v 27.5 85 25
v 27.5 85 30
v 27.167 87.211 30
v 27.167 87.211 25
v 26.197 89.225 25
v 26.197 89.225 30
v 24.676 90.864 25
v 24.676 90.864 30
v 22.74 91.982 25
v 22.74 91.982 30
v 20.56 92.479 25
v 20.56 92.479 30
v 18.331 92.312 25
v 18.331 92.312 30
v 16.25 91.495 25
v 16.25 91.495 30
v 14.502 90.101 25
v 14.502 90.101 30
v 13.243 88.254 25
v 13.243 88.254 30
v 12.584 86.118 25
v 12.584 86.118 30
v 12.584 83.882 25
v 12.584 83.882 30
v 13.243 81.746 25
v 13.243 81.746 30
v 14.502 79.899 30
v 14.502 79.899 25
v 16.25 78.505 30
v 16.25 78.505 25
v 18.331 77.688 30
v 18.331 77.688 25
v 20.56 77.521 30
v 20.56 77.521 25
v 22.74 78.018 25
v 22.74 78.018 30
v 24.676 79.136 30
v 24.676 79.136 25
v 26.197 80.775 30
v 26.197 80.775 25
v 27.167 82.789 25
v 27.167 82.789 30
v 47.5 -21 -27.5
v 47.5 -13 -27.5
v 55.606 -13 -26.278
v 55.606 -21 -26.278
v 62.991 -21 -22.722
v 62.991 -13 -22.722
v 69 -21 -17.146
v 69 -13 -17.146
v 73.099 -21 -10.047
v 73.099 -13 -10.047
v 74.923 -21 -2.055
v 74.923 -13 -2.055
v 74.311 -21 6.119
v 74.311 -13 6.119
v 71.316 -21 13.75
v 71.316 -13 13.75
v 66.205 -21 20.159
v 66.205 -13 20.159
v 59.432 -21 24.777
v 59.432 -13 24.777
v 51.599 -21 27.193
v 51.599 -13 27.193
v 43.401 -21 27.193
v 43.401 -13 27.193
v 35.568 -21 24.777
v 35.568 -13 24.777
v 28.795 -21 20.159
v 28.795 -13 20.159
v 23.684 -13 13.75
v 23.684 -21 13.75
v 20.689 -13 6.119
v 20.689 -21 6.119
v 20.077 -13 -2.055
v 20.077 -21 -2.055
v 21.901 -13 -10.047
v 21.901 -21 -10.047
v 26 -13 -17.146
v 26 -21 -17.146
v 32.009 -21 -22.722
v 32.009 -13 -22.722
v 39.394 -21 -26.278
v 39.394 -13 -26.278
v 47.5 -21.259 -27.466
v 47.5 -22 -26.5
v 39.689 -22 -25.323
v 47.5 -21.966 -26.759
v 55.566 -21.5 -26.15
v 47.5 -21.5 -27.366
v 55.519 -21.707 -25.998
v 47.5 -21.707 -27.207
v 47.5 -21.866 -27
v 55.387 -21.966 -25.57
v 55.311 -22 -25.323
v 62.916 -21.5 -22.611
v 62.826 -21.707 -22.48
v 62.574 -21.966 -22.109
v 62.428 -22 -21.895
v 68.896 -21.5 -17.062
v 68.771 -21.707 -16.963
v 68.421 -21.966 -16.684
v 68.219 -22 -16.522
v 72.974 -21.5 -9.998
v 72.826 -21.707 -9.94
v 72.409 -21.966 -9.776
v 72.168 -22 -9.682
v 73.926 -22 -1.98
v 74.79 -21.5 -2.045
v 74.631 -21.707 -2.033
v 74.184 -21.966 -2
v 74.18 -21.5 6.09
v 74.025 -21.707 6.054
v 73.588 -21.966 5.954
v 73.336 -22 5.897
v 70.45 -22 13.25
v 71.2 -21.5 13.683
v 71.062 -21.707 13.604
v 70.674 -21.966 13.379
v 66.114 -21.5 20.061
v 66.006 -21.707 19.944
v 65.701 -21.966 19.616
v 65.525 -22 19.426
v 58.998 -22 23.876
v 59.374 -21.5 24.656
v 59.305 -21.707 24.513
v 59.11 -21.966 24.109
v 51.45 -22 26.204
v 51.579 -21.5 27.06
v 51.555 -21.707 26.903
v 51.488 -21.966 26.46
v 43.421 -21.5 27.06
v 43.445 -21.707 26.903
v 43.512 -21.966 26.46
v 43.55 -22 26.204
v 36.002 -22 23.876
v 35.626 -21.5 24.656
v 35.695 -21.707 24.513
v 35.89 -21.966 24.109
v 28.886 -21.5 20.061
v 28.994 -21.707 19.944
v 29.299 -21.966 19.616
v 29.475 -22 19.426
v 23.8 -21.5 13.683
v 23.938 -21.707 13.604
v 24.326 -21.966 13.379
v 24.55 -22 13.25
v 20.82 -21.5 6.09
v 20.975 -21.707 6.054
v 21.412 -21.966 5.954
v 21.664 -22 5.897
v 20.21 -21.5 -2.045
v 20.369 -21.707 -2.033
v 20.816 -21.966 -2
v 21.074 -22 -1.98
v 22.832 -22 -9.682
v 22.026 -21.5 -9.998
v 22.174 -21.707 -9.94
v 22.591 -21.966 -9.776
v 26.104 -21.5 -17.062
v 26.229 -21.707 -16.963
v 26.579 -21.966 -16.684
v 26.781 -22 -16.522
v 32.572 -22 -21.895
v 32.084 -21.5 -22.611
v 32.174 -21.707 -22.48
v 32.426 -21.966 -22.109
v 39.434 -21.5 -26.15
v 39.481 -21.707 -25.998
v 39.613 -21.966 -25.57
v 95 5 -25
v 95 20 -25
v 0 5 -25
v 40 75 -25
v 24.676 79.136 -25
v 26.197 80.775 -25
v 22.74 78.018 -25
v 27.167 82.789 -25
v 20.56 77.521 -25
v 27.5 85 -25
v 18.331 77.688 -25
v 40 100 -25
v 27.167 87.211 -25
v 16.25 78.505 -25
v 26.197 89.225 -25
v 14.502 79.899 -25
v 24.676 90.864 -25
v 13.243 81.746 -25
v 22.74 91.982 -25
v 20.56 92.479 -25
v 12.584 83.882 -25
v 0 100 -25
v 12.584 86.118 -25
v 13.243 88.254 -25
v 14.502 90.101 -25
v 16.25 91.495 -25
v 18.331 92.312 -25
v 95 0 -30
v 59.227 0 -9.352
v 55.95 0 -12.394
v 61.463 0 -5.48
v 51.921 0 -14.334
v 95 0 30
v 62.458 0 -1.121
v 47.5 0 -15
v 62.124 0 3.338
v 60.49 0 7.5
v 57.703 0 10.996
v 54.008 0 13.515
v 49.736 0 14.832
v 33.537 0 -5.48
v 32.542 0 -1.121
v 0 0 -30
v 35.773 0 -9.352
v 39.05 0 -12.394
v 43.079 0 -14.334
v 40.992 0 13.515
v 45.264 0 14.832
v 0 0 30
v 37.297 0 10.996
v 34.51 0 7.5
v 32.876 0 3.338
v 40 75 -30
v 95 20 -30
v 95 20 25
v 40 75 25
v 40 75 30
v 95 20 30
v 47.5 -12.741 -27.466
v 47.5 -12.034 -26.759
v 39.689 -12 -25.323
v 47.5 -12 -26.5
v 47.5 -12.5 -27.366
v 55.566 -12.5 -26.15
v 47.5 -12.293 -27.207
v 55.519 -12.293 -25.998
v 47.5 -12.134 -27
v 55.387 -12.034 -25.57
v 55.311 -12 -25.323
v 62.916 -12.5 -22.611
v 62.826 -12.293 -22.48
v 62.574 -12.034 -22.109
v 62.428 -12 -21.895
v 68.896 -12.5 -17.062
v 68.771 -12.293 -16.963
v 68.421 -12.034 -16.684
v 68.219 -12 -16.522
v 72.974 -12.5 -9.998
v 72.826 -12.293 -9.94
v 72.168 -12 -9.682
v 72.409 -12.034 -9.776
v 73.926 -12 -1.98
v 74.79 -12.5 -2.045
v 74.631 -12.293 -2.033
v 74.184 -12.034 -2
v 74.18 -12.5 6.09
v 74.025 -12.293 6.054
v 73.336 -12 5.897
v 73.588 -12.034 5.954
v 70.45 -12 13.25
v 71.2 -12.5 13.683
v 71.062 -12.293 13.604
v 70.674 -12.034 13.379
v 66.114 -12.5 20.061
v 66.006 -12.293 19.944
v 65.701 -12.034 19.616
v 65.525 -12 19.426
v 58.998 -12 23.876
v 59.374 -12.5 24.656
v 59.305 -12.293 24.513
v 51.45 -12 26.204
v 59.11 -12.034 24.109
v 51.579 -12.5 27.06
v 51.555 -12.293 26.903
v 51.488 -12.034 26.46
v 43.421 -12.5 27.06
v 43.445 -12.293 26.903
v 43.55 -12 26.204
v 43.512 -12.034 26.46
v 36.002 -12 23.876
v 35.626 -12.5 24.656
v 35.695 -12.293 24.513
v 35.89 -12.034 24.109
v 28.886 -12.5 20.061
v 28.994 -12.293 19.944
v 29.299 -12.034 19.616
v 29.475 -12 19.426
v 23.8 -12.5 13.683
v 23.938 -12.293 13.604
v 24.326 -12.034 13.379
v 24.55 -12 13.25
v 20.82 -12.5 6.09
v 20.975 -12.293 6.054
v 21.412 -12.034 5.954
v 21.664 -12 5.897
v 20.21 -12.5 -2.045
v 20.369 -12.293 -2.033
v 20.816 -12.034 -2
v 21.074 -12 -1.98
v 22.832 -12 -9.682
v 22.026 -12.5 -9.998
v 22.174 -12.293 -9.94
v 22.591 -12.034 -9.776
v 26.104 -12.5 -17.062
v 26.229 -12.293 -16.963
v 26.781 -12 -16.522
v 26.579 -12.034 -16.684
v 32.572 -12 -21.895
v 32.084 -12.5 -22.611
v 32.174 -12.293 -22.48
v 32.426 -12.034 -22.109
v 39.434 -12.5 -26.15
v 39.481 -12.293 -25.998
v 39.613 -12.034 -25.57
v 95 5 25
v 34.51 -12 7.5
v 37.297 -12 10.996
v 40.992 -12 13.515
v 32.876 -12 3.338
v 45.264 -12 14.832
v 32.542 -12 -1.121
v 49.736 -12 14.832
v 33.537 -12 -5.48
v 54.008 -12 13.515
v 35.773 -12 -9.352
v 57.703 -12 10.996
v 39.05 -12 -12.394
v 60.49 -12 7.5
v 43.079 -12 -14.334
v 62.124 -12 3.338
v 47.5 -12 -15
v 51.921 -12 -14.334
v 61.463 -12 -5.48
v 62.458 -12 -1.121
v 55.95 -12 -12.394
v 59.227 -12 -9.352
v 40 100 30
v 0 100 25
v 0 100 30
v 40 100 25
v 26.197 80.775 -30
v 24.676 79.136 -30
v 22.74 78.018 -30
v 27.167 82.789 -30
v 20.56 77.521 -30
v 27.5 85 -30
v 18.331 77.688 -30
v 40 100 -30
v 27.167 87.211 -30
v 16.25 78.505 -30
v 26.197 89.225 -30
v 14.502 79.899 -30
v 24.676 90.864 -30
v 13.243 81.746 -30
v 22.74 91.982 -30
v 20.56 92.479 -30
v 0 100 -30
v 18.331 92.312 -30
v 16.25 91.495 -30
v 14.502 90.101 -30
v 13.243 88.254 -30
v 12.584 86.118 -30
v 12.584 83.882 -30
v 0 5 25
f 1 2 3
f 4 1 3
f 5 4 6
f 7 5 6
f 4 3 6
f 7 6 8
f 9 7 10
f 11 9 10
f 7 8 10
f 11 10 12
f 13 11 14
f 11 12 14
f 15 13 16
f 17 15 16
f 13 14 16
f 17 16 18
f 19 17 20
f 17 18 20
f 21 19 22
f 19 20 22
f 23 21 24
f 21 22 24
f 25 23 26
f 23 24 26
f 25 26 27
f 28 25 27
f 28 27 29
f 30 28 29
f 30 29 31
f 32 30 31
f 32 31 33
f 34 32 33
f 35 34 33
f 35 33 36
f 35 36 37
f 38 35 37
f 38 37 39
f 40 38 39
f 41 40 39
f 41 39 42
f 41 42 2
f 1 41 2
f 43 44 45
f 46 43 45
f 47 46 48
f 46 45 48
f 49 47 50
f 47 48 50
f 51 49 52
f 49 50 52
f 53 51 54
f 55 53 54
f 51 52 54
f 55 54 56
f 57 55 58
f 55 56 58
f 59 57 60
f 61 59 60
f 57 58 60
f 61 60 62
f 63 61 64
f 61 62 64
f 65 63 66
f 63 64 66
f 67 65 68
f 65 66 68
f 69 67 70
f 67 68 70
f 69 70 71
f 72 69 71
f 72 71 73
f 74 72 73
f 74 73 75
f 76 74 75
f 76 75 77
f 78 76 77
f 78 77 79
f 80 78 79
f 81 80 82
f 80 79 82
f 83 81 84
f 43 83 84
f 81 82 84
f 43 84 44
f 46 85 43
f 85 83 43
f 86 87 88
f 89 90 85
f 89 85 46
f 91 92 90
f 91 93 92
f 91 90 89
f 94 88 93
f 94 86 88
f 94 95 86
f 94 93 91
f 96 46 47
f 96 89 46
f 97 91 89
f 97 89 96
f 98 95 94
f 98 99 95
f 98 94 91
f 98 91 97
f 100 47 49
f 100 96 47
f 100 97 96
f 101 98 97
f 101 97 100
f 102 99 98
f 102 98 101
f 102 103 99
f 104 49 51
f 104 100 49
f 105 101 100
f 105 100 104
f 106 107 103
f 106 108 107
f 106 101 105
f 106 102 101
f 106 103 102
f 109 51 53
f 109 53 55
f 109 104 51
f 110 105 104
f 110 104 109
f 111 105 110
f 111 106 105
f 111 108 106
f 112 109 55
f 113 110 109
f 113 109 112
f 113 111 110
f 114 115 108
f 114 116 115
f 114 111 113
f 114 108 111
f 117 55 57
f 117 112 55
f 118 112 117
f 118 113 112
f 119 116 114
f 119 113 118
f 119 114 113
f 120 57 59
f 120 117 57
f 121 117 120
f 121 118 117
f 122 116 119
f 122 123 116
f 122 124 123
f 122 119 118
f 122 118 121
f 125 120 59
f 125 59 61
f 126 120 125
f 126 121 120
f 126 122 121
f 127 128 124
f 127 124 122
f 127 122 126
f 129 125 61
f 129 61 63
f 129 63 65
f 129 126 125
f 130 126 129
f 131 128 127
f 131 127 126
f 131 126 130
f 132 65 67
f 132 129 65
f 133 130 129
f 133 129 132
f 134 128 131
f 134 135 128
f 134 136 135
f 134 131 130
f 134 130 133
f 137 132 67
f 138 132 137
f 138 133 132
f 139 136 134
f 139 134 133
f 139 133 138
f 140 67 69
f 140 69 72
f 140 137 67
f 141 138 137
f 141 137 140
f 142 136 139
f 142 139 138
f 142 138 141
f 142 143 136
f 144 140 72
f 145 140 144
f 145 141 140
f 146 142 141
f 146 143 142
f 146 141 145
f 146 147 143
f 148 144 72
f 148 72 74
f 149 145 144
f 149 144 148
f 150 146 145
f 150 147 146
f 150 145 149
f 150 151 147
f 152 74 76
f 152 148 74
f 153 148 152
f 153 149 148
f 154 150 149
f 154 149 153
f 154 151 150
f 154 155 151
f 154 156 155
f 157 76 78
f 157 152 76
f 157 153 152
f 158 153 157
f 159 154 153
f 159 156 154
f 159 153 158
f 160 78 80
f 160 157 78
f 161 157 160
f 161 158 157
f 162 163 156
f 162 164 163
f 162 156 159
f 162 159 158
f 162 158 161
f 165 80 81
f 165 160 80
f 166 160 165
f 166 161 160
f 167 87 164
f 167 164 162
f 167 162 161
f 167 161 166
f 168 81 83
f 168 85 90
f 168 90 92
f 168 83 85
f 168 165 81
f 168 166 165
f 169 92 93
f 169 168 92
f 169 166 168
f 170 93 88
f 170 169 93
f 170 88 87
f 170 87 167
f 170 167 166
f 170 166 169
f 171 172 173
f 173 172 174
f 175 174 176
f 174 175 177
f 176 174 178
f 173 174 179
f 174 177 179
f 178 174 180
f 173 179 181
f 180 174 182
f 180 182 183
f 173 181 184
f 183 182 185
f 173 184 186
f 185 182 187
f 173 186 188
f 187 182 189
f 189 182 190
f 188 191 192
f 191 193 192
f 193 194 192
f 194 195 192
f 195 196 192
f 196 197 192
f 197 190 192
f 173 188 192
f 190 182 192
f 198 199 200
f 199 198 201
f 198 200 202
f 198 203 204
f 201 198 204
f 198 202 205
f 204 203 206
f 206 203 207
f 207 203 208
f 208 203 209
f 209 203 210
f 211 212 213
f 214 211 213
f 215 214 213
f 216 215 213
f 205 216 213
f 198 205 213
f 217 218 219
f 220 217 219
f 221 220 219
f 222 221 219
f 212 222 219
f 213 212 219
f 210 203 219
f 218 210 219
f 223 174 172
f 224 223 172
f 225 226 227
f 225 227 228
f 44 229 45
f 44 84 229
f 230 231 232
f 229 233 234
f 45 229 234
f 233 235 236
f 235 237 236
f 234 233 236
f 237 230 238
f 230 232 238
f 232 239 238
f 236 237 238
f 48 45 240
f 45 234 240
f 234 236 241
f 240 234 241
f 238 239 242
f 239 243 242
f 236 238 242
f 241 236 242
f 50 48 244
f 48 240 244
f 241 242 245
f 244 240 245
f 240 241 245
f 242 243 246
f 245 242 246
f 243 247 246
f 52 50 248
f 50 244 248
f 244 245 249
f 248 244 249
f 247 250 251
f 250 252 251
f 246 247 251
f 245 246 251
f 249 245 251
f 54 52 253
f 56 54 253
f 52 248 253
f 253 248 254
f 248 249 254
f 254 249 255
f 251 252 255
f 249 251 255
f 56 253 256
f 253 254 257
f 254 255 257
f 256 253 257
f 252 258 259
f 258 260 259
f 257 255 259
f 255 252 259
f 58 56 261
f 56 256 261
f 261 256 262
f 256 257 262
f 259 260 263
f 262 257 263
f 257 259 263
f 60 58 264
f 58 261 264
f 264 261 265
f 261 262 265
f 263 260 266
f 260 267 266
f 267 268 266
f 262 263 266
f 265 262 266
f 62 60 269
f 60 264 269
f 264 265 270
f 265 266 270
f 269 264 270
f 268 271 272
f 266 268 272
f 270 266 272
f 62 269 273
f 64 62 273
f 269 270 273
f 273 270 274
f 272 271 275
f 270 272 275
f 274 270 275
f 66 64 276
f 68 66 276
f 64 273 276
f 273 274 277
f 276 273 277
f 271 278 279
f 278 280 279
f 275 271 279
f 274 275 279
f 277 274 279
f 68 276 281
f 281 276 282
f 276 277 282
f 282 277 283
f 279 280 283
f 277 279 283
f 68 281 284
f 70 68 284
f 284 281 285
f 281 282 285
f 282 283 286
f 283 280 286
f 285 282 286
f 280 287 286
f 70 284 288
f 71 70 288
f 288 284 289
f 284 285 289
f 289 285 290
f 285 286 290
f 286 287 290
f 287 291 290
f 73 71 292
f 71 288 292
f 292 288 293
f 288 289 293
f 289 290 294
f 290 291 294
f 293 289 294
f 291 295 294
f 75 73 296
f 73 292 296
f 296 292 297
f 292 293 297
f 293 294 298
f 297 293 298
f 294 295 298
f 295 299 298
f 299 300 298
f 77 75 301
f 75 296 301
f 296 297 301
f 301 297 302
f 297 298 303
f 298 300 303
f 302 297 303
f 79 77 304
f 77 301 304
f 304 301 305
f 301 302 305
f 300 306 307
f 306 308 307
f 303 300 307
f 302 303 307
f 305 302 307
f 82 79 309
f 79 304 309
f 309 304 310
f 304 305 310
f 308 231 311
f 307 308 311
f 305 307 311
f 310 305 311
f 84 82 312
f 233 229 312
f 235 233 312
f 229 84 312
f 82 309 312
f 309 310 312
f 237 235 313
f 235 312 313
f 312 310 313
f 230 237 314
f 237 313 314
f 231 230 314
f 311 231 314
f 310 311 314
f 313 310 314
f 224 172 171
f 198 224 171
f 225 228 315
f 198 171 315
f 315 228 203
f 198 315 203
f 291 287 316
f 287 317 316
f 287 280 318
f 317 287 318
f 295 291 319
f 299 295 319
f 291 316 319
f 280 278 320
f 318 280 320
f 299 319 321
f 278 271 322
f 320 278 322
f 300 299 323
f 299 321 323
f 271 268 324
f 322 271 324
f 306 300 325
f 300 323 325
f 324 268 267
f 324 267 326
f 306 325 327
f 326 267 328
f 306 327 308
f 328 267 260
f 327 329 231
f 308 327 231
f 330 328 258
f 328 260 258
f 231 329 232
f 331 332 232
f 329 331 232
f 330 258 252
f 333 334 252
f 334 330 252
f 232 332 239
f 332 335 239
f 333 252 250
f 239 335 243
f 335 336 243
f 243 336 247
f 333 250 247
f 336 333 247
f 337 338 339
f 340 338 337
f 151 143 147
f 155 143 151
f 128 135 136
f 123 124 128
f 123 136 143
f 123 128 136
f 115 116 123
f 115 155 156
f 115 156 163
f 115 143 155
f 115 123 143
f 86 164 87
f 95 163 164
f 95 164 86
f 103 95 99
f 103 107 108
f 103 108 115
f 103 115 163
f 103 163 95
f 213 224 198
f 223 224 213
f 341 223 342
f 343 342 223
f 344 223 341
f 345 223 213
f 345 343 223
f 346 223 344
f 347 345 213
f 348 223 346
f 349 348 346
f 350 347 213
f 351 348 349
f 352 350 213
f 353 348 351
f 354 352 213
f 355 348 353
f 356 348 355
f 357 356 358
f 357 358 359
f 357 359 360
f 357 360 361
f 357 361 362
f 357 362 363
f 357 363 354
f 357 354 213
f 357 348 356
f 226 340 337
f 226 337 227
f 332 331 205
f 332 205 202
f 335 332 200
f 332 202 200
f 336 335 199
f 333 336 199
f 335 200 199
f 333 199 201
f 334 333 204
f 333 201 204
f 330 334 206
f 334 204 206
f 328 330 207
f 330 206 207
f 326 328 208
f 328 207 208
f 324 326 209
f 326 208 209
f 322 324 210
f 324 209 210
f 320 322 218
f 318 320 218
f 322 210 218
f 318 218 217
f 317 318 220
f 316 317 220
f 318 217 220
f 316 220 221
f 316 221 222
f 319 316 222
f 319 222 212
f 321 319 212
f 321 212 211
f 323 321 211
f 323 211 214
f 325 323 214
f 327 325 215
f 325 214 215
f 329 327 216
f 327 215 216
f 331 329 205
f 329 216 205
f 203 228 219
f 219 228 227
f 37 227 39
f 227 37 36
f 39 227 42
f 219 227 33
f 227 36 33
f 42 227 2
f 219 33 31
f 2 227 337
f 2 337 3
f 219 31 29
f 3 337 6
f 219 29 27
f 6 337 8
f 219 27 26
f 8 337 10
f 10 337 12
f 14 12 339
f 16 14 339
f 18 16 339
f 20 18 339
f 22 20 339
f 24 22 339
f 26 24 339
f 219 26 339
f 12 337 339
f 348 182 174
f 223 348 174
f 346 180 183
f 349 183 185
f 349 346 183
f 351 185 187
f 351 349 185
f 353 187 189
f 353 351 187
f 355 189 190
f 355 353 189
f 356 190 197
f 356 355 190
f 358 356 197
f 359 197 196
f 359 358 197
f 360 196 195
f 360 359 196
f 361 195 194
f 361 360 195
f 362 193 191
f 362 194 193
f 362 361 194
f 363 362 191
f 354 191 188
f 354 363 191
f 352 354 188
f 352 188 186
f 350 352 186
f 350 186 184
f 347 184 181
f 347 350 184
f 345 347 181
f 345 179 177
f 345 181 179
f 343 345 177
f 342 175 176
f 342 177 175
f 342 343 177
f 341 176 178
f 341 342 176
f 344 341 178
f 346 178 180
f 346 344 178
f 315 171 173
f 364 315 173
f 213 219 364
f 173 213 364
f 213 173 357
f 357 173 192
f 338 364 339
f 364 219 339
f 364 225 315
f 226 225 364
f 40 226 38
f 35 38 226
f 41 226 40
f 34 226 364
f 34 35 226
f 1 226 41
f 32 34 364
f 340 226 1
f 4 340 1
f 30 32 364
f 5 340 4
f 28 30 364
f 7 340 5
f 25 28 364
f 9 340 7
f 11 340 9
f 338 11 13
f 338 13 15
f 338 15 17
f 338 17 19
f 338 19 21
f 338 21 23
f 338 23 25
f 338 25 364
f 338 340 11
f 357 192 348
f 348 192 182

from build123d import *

# Parameters (mm, degrees)
BOSS_EXTRUDE1_DEPTH = 5
BOSS_EXTRUDE2_DEPTH = 5
SKETCH3_R           = 7.5
CUT_EXTRUDE1_DEPTH  = 149.492424049
SKETCH4_R           = 15
BOSS_EXTRUDE3_DEPTH = 12
SKETCH5_R           = 27.5
BOSS_EXTRUDE4_DEPTH = 10
FILLET1_R           = 1


with BuildPart() as part:
    # Sketch1 → Boss-Extrude1 (new body)
    with BuildSketch(Plane(origin=(0, 0, 0), x_dir=(1, 0, 0), z_dir=(0, 1, 0))):
        Polygon((0, 0), (0, 25), (95, 25), (95, -25), (0, -25), align=None)
    extrude(amount=BOSS_EXTRUDE1_DEPTH)

    # Sketch2 → Boss-Extrude2 (add)
    with BuildSketch(Plane.XY.offset(25)):
        Polygon((0, 0), (0, 100), (40, 100), (40, 75), (95, 20), (95, 0), align=None)
    boss_extrude2 = extrude(amount=BOSS_EXTRUDE2_DEPTH)

    # Sketch3 → Cut-Extrude1 (cut, through all)
    with BuildSketch(Plane.XY.offset(30)):
        with Locations((20, 85)):
            Circle(SKETCH3_R)
    cut_extrude1 = extrude(amount=-CUT_EXTRUDE1_DEPTH, mode=Mode.SUBTRACT)

    # Mirror1: Boss-Extrude2, Cut-Extrude1 across plane
    add(boss_extrude2.mirror(Plane.XY))
    add(cut_extrude1.mirror(Plane.XY), mode=Mode.SUBTRACT)

    # Sketch4 → Boss-Extrude3 (add)
    with BuildSketch(Plane(origin=(0, 0, 0), x_dir=(-1, 0, 0), z_dir=(0, -1, 0))):
        with Locations(Location((-47.5, 0, 0), (0, 0, 90))):
            Circle(SKETCH4_R)
    extrude(amount=BOSS_EXTRUDE3_DEPTH)

    # Sketch5 → Boss-Extrude4 (add)
    with BuildSketch(Plane(origin=(0, -12, 0), x_dir=(-1, 0, 0), z_dir=(0, -1, 0))):
        with Locations(Location((-47.5, 0, 0), (0, 0, 90))):
            Circle(SKETCH5_R)
    extrude(amount=BOSS_EXTRUDE4_DEPTH)

    # Fillet1
    fillet1_edges = [part.edges().sort_by_distance(p)[0] for p in [
        (47.5, -12, 27.5),
        (47.5, -22, 27.5),
    ]]
    fillet(fillet1_edges, radius=FILLET1_R)


solid = part.part
